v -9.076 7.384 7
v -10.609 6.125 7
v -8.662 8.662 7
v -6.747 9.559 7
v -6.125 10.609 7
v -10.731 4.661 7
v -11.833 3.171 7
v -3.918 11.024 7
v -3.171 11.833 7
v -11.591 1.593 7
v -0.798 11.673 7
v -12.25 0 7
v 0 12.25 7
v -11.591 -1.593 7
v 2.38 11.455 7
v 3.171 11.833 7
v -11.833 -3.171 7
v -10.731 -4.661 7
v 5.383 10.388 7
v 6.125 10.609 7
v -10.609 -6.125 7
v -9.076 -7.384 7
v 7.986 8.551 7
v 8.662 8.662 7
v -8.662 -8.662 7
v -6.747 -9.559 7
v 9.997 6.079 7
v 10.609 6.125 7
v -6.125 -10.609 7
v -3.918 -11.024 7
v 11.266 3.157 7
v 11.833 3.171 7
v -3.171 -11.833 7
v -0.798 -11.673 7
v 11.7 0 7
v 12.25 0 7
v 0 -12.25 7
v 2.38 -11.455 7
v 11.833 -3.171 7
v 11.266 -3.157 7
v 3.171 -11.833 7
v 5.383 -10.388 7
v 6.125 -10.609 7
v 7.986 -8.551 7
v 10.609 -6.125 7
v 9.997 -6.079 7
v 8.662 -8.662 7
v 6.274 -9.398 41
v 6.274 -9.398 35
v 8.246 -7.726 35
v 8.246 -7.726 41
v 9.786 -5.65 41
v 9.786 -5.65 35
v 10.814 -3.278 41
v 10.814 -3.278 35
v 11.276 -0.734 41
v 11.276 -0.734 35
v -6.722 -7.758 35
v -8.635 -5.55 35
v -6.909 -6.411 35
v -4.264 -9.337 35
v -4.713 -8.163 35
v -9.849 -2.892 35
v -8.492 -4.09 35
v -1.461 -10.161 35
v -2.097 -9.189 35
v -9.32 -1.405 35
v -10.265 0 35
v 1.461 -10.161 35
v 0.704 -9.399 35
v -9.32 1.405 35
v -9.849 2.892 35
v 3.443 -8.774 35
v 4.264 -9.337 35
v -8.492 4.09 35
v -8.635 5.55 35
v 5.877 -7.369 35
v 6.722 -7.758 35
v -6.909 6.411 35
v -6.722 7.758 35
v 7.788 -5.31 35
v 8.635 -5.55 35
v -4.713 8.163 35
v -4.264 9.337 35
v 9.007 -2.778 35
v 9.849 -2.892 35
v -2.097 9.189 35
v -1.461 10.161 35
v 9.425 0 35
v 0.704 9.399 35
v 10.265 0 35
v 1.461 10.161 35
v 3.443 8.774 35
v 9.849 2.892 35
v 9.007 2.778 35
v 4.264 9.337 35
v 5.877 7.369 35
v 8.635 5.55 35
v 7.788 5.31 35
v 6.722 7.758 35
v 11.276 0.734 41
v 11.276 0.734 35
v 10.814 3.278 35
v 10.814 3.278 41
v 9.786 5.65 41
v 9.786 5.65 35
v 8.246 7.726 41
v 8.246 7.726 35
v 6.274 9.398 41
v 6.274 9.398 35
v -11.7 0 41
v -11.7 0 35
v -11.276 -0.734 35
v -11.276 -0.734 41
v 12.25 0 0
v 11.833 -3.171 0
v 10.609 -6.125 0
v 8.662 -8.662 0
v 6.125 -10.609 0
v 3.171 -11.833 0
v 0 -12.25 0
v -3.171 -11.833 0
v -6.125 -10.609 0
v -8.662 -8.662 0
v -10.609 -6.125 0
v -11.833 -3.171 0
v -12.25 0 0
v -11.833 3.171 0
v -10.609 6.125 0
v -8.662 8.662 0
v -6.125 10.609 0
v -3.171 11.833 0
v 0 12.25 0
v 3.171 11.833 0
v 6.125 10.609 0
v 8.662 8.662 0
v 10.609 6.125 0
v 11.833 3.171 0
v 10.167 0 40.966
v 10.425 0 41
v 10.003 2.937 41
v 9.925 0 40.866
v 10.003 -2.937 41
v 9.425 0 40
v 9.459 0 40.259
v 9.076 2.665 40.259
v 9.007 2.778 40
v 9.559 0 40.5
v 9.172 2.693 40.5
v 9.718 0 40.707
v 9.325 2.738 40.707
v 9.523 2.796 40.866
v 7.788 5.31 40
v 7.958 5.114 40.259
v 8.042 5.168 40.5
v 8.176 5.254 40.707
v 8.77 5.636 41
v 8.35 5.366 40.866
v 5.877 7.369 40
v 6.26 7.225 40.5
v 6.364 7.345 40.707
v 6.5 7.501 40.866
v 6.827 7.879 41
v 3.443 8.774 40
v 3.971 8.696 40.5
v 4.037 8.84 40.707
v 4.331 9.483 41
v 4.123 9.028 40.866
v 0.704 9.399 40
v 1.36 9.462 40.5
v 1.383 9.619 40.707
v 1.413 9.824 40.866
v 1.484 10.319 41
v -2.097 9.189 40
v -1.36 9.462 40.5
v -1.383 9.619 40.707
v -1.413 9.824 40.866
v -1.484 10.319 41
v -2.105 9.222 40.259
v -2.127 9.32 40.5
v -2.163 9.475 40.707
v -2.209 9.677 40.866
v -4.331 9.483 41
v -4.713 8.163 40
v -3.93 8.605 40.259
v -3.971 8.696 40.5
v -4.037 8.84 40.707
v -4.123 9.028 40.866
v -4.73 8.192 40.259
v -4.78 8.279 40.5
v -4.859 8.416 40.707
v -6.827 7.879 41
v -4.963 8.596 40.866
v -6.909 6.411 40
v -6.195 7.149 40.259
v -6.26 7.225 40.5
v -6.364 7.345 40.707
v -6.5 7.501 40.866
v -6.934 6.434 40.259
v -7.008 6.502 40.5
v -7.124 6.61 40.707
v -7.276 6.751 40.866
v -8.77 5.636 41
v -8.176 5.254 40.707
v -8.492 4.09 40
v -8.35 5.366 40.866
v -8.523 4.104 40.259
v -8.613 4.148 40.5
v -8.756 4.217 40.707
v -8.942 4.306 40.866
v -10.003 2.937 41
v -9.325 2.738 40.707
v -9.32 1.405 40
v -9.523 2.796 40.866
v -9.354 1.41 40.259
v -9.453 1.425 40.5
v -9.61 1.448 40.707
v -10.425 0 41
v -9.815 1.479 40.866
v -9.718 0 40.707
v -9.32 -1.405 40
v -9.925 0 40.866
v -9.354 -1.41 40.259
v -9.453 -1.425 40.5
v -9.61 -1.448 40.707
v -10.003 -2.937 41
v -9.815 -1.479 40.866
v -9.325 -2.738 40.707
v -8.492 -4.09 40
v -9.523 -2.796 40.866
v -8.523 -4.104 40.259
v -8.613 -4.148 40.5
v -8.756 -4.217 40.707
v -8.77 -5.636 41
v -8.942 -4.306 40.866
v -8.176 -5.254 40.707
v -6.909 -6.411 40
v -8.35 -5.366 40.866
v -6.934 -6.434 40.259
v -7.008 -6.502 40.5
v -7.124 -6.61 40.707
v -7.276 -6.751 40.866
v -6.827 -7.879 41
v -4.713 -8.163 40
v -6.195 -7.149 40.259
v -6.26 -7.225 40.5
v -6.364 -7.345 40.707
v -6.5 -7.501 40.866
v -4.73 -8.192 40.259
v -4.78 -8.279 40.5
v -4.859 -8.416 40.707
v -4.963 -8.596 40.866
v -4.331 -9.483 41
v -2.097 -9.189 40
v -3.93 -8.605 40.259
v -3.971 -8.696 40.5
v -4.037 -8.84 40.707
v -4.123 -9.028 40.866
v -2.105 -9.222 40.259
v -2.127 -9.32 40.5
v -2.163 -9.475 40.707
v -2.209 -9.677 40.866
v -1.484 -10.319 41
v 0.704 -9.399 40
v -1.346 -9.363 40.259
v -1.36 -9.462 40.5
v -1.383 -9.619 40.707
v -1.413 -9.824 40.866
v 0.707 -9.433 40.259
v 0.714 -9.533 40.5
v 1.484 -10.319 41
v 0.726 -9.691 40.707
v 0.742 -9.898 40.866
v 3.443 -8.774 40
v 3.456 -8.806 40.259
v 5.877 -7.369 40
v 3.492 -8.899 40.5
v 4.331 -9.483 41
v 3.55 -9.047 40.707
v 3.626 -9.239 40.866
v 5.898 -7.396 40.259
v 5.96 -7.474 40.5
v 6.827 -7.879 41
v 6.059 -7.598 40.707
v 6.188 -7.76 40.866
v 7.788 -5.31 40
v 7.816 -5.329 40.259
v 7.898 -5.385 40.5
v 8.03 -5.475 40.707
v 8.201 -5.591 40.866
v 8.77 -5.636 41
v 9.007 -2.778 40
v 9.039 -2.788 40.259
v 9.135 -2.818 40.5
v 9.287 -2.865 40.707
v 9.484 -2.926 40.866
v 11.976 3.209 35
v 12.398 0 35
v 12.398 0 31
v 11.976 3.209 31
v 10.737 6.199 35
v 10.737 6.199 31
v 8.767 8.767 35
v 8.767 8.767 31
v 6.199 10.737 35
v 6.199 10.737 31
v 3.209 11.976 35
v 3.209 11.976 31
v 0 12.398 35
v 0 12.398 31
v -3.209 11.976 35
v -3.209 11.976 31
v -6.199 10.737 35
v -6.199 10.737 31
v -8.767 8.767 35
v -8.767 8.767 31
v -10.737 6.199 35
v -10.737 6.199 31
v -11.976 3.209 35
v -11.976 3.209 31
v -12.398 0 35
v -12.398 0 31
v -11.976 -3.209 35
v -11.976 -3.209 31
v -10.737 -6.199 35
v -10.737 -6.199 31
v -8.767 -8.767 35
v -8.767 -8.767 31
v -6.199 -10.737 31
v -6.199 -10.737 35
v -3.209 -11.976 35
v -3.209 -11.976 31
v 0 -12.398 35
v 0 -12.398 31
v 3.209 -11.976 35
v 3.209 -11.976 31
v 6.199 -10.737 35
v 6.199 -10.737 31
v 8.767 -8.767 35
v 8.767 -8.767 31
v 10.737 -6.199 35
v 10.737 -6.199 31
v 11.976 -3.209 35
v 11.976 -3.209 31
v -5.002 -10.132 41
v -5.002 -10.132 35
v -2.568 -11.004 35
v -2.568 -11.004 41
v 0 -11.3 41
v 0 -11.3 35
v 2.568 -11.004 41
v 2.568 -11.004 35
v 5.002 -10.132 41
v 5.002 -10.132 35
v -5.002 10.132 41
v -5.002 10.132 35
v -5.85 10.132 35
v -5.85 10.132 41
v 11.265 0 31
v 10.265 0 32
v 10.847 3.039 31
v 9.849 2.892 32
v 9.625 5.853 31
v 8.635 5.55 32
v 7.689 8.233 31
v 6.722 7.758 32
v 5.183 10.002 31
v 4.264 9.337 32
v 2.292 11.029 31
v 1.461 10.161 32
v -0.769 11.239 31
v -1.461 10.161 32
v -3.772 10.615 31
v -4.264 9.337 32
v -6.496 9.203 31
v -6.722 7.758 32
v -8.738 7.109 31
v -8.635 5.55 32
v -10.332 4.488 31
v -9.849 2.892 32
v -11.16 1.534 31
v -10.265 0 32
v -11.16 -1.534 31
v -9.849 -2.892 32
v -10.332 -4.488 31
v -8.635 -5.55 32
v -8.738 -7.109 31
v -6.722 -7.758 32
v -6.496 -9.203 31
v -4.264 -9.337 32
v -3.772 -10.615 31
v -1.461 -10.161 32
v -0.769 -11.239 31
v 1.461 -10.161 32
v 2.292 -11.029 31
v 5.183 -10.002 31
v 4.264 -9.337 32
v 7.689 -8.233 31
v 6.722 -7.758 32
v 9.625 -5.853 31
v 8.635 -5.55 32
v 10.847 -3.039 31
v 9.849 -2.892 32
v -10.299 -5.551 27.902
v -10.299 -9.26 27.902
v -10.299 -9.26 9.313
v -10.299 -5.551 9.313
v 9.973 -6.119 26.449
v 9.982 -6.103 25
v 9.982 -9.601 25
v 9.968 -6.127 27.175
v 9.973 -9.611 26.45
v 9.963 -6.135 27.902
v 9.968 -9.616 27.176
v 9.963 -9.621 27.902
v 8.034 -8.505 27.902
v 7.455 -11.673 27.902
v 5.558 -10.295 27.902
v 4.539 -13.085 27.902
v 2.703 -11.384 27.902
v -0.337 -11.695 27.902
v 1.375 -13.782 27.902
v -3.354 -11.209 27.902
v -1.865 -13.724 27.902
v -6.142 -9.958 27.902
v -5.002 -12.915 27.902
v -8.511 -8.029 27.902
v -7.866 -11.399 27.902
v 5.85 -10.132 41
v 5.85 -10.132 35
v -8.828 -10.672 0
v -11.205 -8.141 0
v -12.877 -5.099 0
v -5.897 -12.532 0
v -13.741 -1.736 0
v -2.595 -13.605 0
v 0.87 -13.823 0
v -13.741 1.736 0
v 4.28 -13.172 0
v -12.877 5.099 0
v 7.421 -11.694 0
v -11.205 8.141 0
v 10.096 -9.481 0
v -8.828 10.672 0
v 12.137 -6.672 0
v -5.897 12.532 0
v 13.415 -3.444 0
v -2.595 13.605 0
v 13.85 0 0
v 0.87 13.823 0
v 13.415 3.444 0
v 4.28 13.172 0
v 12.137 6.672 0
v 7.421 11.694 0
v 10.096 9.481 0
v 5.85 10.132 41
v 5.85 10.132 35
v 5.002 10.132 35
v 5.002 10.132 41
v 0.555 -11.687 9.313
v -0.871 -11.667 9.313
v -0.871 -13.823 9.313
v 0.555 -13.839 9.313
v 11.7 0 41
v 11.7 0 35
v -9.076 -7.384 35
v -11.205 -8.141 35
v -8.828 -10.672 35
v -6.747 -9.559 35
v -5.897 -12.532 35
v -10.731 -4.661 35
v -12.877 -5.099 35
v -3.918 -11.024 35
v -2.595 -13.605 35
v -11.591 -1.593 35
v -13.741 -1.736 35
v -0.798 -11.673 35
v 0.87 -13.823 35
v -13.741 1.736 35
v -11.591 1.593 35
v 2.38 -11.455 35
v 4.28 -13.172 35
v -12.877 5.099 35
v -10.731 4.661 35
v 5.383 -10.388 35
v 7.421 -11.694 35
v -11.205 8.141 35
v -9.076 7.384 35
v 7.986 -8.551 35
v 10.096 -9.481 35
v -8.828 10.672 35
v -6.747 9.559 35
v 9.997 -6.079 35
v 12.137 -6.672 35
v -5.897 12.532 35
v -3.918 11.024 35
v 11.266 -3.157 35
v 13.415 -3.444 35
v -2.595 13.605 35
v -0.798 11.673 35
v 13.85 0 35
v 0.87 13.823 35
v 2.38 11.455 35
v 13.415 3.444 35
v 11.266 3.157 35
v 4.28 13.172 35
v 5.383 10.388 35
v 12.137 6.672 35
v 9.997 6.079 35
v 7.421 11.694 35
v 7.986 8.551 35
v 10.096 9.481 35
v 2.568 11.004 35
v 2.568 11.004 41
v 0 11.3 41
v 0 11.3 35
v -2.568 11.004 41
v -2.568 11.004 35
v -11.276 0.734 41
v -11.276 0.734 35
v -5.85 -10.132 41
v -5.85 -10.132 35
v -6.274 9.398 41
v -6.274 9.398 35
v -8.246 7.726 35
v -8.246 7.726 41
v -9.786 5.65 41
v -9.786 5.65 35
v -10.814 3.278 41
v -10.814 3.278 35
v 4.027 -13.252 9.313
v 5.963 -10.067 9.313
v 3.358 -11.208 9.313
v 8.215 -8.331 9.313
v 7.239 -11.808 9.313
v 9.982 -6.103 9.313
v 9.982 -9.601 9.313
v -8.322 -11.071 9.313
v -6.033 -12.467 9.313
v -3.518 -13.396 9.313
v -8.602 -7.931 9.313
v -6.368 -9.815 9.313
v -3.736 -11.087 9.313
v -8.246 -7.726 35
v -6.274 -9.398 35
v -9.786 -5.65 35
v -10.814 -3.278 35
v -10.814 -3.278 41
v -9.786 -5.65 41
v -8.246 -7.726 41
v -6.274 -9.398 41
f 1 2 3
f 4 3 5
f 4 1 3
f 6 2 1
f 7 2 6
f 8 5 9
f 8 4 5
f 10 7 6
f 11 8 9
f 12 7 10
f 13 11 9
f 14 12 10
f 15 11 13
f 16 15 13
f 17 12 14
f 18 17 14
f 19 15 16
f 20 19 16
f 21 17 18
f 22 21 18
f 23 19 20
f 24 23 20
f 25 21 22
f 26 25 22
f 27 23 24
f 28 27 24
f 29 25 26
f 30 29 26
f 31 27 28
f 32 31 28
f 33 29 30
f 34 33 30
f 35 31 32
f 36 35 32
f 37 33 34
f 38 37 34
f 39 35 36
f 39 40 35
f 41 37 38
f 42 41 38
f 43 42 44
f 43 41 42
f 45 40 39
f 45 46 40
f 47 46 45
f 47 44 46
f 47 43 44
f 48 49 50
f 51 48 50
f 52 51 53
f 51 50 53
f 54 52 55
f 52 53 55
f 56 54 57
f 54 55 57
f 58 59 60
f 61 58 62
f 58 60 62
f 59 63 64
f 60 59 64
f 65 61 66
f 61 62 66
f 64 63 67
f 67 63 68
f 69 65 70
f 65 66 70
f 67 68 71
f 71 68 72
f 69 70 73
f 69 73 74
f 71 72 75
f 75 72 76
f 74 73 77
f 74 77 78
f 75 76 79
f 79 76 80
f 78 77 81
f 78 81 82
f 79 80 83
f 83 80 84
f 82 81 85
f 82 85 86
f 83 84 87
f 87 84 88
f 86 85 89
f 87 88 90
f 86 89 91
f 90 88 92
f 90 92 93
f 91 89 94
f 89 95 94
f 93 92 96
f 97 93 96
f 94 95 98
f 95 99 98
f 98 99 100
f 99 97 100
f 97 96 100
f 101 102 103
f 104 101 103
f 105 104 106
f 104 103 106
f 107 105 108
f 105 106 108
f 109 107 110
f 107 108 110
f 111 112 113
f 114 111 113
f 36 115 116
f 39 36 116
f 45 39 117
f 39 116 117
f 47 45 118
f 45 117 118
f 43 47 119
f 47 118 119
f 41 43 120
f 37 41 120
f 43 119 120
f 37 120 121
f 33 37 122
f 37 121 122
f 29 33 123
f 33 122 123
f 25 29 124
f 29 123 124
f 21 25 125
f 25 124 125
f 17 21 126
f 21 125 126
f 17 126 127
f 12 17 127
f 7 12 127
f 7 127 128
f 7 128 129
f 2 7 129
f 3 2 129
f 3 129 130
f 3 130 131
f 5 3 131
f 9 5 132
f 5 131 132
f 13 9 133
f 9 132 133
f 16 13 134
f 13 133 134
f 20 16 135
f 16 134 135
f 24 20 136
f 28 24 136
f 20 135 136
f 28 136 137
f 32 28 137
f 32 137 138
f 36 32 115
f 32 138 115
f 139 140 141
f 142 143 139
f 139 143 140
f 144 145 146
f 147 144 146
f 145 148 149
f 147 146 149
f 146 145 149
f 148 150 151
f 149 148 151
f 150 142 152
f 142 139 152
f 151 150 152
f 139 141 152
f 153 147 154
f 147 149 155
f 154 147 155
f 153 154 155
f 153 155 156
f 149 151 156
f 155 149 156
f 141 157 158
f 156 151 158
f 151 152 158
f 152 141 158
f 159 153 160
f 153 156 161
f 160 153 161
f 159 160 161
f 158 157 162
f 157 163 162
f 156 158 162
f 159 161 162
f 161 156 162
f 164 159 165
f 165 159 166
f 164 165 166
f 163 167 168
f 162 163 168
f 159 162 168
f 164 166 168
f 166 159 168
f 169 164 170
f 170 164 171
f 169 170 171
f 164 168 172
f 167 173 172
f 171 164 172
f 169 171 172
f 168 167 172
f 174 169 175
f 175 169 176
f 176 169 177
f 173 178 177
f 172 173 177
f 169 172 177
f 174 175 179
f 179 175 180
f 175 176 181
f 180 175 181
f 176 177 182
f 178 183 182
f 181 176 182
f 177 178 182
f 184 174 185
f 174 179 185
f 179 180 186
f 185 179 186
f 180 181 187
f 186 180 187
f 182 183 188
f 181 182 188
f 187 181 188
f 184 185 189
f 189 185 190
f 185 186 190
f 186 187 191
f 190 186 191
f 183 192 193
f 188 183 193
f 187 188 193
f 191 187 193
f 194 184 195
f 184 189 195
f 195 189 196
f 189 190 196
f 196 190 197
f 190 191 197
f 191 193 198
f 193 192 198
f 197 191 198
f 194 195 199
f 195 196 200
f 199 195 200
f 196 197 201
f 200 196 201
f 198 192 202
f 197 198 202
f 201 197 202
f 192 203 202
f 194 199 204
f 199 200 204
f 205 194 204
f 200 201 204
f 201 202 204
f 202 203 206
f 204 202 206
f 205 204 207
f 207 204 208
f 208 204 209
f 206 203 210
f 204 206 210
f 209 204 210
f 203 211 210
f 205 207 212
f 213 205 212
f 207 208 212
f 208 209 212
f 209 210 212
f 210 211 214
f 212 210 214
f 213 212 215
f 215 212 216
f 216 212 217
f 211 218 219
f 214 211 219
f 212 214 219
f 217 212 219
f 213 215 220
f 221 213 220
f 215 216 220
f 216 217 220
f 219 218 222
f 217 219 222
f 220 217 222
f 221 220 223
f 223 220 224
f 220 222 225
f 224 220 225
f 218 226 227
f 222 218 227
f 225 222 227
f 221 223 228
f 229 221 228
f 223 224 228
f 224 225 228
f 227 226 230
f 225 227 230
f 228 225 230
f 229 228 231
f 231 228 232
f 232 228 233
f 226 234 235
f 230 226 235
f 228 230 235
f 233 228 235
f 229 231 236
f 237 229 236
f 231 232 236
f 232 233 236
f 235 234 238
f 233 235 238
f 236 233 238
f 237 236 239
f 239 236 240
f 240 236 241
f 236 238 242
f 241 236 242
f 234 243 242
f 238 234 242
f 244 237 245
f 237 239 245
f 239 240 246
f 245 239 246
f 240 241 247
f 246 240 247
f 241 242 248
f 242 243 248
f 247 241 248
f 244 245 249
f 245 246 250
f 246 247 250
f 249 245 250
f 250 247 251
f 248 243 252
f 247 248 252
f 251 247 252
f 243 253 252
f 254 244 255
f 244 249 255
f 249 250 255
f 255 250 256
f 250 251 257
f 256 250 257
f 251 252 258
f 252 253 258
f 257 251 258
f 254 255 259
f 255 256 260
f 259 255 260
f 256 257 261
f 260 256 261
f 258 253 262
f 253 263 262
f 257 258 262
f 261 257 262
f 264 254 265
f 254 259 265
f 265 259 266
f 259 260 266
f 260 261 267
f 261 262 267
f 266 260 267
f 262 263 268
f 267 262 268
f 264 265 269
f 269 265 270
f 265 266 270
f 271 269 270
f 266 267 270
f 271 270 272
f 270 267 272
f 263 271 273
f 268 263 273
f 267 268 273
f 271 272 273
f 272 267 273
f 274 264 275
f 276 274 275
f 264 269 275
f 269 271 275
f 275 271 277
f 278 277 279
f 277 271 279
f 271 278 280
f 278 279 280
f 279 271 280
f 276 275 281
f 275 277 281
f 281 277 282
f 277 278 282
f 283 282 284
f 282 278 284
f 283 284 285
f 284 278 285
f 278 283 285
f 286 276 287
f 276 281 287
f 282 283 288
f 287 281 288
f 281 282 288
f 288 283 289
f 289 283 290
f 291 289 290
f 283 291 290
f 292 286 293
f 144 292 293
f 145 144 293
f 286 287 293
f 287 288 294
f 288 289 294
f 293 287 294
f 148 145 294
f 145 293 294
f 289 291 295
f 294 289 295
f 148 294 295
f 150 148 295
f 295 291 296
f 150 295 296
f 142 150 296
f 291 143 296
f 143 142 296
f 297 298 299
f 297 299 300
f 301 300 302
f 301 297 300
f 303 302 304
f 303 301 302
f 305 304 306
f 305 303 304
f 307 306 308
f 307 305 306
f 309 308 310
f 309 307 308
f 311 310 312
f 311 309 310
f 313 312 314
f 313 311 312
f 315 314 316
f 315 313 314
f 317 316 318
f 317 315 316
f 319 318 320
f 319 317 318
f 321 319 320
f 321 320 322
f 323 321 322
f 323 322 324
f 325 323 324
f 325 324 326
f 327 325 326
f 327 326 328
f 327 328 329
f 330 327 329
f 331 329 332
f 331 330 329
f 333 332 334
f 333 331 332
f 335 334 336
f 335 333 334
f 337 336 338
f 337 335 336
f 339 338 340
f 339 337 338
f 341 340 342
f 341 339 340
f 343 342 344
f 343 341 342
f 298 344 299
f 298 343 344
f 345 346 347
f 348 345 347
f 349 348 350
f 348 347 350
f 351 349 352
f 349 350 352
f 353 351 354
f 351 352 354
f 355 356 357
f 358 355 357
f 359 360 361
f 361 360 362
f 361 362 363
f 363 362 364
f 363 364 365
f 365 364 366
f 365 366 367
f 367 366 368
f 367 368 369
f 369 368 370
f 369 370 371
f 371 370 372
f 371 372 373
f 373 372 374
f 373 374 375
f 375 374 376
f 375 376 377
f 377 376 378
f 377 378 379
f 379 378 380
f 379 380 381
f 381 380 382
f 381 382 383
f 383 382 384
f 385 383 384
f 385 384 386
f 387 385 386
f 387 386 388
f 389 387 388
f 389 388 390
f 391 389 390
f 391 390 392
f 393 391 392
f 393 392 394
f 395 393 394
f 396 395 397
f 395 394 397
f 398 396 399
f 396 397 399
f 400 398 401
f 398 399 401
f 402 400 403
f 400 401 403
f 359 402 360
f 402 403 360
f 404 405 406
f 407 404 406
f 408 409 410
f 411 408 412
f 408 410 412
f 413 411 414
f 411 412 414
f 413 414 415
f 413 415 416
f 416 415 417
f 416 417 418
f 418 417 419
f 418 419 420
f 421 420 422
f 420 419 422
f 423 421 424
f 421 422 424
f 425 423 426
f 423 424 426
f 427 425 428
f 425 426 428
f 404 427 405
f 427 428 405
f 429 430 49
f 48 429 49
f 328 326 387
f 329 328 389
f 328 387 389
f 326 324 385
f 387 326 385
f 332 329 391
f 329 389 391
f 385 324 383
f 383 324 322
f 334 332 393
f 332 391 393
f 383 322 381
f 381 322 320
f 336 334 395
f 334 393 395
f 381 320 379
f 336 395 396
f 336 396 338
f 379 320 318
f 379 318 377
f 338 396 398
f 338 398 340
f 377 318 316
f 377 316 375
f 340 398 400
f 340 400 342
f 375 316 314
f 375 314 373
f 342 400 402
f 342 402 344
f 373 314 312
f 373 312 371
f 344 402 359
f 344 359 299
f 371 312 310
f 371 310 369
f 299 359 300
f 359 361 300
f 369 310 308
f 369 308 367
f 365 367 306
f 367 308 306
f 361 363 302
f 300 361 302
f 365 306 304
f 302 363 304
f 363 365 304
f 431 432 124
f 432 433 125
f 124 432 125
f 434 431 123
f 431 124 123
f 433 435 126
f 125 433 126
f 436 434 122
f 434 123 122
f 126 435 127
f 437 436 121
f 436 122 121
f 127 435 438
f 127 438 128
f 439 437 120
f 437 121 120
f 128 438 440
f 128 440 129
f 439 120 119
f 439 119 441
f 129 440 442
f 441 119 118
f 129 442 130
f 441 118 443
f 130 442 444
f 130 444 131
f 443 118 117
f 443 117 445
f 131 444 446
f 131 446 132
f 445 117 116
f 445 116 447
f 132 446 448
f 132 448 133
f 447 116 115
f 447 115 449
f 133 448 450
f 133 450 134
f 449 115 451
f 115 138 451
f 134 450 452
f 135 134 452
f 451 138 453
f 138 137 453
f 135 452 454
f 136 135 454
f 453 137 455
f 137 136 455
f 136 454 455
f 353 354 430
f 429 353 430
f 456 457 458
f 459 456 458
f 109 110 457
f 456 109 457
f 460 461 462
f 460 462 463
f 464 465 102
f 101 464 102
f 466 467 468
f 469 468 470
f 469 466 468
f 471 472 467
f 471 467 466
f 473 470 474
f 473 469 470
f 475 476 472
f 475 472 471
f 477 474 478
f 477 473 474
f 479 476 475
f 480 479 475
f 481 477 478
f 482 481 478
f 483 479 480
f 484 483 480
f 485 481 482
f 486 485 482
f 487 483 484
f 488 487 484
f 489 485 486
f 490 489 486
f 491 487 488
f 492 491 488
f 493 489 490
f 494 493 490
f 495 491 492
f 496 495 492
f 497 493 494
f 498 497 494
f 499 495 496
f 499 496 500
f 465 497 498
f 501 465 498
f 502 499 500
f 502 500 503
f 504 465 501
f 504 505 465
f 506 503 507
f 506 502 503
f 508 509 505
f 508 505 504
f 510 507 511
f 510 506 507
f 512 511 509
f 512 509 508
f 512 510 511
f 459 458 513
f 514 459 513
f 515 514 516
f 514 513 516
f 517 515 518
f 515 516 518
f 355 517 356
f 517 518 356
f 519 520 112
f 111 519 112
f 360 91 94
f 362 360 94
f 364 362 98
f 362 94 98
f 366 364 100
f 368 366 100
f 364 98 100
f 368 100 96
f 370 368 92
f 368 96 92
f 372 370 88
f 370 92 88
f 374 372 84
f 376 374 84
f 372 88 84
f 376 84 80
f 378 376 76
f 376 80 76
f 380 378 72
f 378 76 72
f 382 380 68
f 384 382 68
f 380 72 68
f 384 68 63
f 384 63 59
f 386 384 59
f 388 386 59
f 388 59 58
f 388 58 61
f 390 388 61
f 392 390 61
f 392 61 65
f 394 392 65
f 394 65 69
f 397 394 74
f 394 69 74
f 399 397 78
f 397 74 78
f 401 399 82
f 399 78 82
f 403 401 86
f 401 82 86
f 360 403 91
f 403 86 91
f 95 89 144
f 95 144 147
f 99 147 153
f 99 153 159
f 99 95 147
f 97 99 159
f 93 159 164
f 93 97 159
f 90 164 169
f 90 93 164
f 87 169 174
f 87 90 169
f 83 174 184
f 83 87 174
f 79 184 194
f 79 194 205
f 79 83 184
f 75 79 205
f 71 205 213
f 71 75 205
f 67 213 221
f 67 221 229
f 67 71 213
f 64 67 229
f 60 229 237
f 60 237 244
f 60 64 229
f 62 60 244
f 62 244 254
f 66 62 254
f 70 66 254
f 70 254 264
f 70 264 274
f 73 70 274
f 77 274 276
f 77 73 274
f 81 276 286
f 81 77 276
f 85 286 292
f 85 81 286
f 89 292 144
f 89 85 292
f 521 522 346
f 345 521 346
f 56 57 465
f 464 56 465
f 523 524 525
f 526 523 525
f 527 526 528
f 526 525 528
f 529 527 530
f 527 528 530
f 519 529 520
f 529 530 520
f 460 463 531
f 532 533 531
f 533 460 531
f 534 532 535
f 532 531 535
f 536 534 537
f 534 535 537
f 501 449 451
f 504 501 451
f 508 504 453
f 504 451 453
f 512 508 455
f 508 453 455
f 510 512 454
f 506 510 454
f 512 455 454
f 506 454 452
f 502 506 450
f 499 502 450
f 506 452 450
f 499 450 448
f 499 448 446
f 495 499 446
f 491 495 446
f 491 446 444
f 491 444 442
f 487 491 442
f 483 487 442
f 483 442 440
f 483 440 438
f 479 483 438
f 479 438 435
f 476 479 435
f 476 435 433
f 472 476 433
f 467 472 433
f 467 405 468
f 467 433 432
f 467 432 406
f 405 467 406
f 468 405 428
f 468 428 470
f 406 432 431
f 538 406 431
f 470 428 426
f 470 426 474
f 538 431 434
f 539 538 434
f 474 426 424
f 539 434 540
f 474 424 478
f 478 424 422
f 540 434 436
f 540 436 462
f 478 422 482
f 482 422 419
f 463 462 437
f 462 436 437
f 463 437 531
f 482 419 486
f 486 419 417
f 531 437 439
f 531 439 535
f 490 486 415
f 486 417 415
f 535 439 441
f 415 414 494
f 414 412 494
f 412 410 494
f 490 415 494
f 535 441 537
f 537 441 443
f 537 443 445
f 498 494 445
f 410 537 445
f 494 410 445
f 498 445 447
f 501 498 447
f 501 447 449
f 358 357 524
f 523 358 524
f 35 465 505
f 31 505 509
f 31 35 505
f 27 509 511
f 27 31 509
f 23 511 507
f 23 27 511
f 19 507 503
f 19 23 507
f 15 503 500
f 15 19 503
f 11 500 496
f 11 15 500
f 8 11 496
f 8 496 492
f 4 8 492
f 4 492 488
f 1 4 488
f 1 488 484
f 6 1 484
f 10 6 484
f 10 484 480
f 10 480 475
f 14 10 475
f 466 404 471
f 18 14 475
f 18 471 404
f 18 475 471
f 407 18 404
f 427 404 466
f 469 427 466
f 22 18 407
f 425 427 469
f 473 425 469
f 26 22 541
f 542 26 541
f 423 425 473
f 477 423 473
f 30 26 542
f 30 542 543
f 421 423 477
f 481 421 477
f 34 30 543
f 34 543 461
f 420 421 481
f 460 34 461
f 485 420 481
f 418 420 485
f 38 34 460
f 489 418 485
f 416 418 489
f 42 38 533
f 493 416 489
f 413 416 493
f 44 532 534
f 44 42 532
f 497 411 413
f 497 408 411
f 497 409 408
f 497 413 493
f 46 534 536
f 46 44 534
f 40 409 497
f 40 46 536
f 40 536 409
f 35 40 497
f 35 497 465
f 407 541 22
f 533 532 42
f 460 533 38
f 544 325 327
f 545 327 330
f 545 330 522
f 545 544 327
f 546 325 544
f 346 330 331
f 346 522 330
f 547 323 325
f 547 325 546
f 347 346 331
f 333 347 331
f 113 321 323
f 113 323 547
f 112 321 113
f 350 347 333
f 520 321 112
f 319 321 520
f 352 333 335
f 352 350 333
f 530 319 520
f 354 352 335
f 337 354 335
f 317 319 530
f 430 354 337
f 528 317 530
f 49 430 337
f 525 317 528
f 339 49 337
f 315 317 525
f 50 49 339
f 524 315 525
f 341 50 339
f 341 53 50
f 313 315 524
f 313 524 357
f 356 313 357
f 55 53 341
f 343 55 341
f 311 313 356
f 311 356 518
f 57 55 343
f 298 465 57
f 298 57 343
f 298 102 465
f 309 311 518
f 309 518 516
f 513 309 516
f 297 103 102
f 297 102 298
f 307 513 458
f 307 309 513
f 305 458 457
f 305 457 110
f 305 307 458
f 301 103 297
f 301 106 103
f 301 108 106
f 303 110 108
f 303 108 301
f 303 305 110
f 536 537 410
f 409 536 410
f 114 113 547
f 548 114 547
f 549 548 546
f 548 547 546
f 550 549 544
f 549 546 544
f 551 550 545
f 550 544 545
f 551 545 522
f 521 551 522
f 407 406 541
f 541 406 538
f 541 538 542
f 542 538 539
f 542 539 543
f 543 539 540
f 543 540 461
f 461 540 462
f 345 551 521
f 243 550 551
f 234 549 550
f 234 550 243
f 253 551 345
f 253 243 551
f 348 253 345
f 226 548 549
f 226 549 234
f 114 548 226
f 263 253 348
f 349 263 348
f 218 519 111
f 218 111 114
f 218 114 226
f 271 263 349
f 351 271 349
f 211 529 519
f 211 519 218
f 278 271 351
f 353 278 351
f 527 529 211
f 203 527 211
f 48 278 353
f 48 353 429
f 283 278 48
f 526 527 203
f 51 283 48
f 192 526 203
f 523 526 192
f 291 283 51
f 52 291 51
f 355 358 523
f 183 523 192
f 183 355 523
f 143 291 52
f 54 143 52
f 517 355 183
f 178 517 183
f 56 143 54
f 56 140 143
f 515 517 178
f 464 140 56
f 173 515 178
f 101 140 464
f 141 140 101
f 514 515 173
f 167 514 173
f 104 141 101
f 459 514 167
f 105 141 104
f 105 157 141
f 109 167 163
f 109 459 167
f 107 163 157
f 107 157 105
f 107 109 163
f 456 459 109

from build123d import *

# Parameters (mm, degrees)
F0_R      = 13.85
F0_R_2    = 11.7
F1_DEPTH  = 35
F2_R      = 9.4254173389
F3_DEPTH  = 6
F4_R      = 12.3979909048
F4_R_2    = 10.2650176462
F5_DEPTH  = 4
F6_SIZE   = 1
F7_R      = 1
F8_R      = 12.25
F9_DEPTH  = 7
F12_DEPTH = 13
F14_DEPTH = 10


with BuildPart() as f1:
    # F0 (on Top) → F1 (new body)
    with BuildSketch(Plane.XY):
        Circle(F0_R)
        Circle(F0_R_2, mode=Mode.SUBTRACT)
    extrude(amount=F1_DEPTH)

    # F8 (on face) → F9 (cut)
    with BuildSketch(Plane(origin=(0, 0, 0), x_dir=(1, 0, 0), z_dir=(0, 0, -1))):
        Circle(F8_R)
    extrude(amount=-F9_DEPTH, mode=Mode.SUBTRACT)

    # F11 (on offset) → F12 (cut)
    with BuildSketch(Plane.XZ.offset(14)):
        Polygon((9.9823940545, 25), (-10.2992961183, 25), (-10.2992961183, 17.1566890553), (-10.2992961183, 9.3133781105), (-0.8714802098, 9.3133781105), (0.554578146, 9.3133781105), (9.9823940545, 9.3133781105), (9.9823940545, 17.1566890553), align=None)
        with BuildLine():
            Line((0.554578146, 9.3133781105), (-0.8714802098, 9.3133781105))
            ThreePointArc((-0.8714802098, 9.3133781105), (-0.1584510319, 9.2890687527), (0.554578146, 9.3133781105))
        make_face()
    extrude(amount=-F12_DEPTH, mode=Mode.SUBTRACT)

    # F13 (on offset) → F14 (cut)
    with BuildSketch(Plane.XZ.offset(14)):
        Polygon((-10.2992961183, 27.9020555317), (-10.2992961183, 25), (9.9823940545, 25), (9.9626844749, 27.9020555317), align=None)
    extrude(amount=-F14_DEPTH, mode=Mode.SUBTRACT)


with BuildPart() as f3:
    # F2 (on face) → F3 (new body)
    with BuildSketch(Plane.XY.offset(35)):
        with BuildLine():
            ThreePointArc((11.276124747, -0.7341734743), (11.2940296095, -0.3672807911), (11.3, 0))
            ThreePointArc((11.3, 0), (11.2940296095, 0.3672807911), (11.276124747, 0.7341734743))
            Line((11.276124747, 0.7341734743), (6.273875253, 9.39832375))
            ThreePointArc((6.273875253, 9.39832375), (5.65, 9.7860870628), (5.002249494, 10.1324972243))
            Line((5.002249494, 10.1324972243), (-5.002249494, 10.1324972243))
            ThreePointArc((-5.002249494, 10.1324972243), (-5.65, 9.7860870628), (-6.273875253, 9.39832375))
            Line((-6.273875253, 9.39832375), (-11.276124747, 0.7341734743))
            ThreePointArc((-11.276124747, 0.7341734743), (-11.3, 0), (-11.276124747, -0.7341734743))
            Line((-11.276124747, -0.7341734743), (-6.273875253, -9.39832375))
            ThreePointArc((-6.273875253, -9.39832375), (-5.65, -9.7860870628), (-5.002249494, -10.1324972243))
            Line((-5.002249494, -10.1324972243), (5.002249494, -10.1324972243))
            ThreePointArc((5.002249494, -10.1324972243), (5.65, -9.7860870628), (6.273875253, -9.39832375))
            Line((6.273875253, -9.39832375), (11.276124747, -0.7341734743))
        make_face()
        Circle(F2_R, mode=Mode.SUBTRACT)
        with BuildLine():
            ThreePointArc((11.276124747, 0.7341734743), (11.2940296095, 0.3672807911), (11.3, 0))
            ThreePointArc((11.3, 0), (11.2940296095, -0.3672807911), (11.276124747, -0.7341734743))
            Line((11.276124747, -0.7341734743), (11.7, 0))
            Line((11.7, 0), (11.276124747, 0.7341734743))
        make_face()
        with BuildLine():
            Line((6.273875253, 9.39832375), (11.276124747, 0.7341734743))
            ThreePointArc((11.276124747, 0.7341734743), (9.7860870628, 5.65), (6.273875253, 9.39832375))
        make_face()
        with BuildLine():
            ThreePointArc((6.273875253, -9.39832375), (9.7860870628, -5.65), (11.276124747, -0.7341734743))
            Line((11.276124747, -0.7341734743), (6.273875253, -9.39832375))
        make_face()
        with BuildLine():
            ThreePointArc((5.002249494, 10.1324972243), (5.65, 9.7860870628), (6.273875253, 9.39832375))
            Line((6.273875253, 9.39832375), (5.85, 10.1324972243))
            Line((5.85, 10.1324972243), (5.002249494, 10.1324972243))
        make_face()
        with BuildLine():
            Line((5.85, -10.1324972243), (6.273875253, -9.39832375))
            ThreePointArc((6.273875253, -9.39832375), (5.65, -9.7860870628), (5.002249494, -10.1324972243))
            Line((5.002249494, -10.1324972243), (5.85, -10.1324972243))
        make_face()
        with BuildLine():
            Line((-5.002249494, 10.1324972243), (5.002249494, 10.1324972243))
            ThreePointArc((5.002249494, 10.1324972243), (0, 11.3), (-5.002249494, 10.1324972243))
        make_face()
        with BuildLine():
            ThreePointArc((-5.002249494, -10.1324972243), (0, -11.3), (5.002249494, -10.1324972243))
            Line((5.002249494, -10.1324972243), (-5.002249494, -10.1324972243))
        make_face()
        with BuildLine():
            ThreePointArc((-6.273875253, 9.39832375), (-5.65, 9.7860870628), (-5.002249494, 10.1324972243))
            Line((-5.002249494, 10.1324972243), (-5.85, 10.1324972243))
            Line((-5.85, 10.1324972243), (-6.273875253, 9.39832375))
        make_face()
        with BuildLine():
            Line((-5.85, -10.1324972243), (-5.002249494, -10.1324972243))
            ThreePointArc((-5.002249494, -10.1324972243), (-5.65, -9.7860870628), (-6.273875253, -9.39832375))
            Line((-6.273875253, -9.39832375), (-5.85, -10.1324972243))
        make_face()
        with BuildLine():
            Line((-11.276124747, 0.7341734743), (-6.273875253, 9.39832375))
            ThreePointArc((-6.273875253, 9.39832375), (-9.7860870628, 5.65), (-11.276124747, 0.7341734743))
        make_face()
        with BuildLine():
            ThreePointArc((-11.276124747, -0.7341734743), (-9.7860870628, -5.65), (-6.273875253, -9.39832375))
            Line((-6.273875253, -9.39832375), (-11.276124747, -0.7341734743))
        make_face()
        with BuildLine():
            ThreePointArc((-11.276124747, -0.7341734743), (-11.3, 0), (-11.276124747, 0.7341734743))
            Line((-11.276124747, 0.7341734743), (-11.7, 0))
            Line((-11.7, 0), (-11.276124747, -0.7341734743))
        make_face()
    extrude(amount=F3_DEPTH)

    # F4 (on face) → F5 (join)
    with BuildSketch(Plane.XY.offset(35)):
        Circle(F4_R)
        Circle(F4_R_2, mode=Mode.SUBTRACT)
    extrude(amount=-F5_DEPTH)

    # F6
    f6_edges = [f3.edges().sort_by_distance(p)[0] for p in [
        (-10.265018, 0, 31),
    ]]
    chamfer(f6_edges, length=F6_SIZE)

    # F7
    f7_edges = [f3.edges().sort_by_distance(p)[0] for p in [
        (-9.425417, 0, 41),
    ]]
    fillet(f7_edges, radius=F7_R)


solid = Compound([f1.part, f3.part])
